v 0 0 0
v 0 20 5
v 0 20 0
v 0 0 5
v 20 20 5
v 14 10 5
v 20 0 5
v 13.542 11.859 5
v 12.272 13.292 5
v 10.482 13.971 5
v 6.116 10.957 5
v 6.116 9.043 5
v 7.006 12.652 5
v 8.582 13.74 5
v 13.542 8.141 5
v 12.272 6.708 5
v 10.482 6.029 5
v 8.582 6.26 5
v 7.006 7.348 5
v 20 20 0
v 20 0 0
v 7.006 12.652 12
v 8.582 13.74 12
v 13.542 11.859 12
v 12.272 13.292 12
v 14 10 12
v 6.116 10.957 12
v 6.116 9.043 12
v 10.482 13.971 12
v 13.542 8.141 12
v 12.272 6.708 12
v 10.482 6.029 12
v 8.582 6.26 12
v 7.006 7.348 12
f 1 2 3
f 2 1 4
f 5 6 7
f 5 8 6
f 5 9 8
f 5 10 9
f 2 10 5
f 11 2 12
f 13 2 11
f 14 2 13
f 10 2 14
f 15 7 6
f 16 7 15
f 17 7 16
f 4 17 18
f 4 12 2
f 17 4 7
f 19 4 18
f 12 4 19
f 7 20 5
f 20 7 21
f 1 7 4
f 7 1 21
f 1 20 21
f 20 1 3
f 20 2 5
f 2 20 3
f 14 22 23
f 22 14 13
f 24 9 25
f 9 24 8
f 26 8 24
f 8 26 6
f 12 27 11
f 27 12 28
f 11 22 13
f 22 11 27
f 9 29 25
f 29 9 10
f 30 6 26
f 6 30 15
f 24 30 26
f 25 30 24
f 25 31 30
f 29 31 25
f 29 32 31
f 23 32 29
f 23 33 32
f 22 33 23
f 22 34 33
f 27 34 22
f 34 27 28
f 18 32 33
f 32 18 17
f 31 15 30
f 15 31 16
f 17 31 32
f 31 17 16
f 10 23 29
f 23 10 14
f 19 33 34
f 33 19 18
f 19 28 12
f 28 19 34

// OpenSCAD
// The exact-geometry audit's case x08 (docs/audits/exact-geometry-rust.md).
// volume: 2351.858377202057
union() { hull() cube([20,20,5]); translate([10,10,2]) cylinder(r=4, h=10); }
